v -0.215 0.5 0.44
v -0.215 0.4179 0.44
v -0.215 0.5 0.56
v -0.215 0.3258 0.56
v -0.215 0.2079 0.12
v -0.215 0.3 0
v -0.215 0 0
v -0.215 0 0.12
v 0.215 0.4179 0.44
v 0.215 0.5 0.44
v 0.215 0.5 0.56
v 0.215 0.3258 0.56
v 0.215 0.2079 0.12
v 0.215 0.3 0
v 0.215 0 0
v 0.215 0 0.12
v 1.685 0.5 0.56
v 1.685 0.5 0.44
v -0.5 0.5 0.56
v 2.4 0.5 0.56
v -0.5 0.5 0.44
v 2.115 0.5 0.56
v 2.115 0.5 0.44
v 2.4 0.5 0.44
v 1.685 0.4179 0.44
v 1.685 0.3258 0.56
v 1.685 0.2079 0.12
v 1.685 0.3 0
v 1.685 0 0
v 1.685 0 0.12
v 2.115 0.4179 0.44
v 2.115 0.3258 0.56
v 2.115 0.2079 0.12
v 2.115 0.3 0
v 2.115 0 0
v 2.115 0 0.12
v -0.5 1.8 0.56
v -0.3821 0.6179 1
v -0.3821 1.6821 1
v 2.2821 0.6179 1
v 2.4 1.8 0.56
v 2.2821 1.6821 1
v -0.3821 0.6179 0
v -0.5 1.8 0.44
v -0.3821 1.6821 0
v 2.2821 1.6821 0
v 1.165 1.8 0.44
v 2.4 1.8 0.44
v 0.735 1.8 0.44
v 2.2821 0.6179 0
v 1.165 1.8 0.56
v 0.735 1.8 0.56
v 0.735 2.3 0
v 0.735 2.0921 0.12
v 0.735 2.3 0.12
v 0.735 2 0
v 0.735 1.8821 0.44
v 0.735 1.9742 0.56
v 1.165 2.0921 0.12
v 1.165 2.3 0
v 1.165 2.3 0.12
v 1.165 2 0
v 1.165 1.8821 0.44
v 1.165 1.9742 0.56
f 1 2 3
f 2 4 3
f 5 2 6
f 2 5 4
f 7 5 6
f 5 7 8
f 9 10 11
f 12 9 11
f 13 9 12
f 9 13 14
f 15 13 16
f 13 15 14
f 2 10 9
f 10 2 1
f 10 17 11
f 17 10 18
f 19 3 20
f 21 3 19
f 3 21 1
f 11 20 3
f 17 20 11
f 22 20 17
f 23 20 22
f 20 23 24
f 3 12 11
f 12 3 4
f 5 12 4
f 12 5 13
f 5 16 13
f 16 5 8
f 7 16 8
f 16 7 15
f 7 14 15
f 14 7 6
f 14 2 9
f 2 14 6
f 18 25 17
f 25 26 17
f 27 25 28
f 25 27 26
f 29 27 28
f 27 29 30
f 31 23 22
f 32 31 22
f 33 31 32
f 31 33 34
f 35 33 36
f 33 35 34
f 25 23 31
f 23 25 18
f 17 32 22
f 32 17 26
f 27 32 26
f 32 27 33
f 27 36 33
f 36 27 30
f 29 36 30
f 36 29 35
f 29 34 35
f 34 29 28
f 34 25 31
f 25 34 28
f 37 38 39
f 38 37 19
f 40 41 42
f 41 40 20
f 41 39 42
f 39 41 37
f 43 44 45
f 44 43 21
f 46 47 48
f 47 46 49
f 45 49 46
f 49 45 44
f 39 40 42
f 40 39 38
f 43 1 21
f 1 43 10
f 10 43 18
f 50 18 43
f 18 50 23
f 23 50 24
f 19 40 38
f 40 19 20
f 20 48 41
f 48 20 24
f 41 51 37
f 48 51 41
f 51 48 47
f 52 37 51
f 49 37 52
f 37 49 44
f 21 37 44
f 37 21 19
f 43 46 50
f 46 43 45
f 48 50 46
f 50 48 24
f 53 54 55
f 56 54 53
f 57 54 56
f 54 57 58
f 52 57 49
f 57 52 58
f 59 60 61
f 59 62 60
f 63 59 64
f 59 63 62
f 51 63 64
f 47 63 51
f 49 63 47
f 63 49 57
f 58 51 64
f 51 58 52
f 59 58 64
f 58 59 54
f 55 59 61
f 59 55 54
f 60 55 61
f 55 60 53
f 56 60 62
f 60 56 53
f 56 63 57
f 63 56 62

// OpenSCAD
// file: pin.scad
// This module outputs bended pin
// _L - whole pin length
// _l - length of bottom part
// _H - whole pin height
// _th - pin thickness
// _a - bending angle
// _W - pin width
module pin(_L,_l,_H,_th,_a,_W)
{
	// Internal variables
    _d1 = _th*sin(_a) / (1-cos(_a));
    _d2 = (_th-_H)*cos(_a) / sin(_a);

	rotate([90,0,90])
    // Extrude the following polygon
	linear_extrude(height = _W, center = true, convexity = 10, twist = 0)
        polygon([[0,0],
                 [_l,0],
				 [_l+_d2,_H-_th],
				 [_L,_H-_th],
				 [_L,_H],
				 [_l+_d2-_d1,_H],
				 [_l-_d1,_th],
				 [0,_th]]);
}

// Example of usage
pin(2,1,1,0.2,115,0.5);
// file: case.scad
// This module draws case
// _L - case length
// _W - case width
// _H - case height
// _ph - top point (vertical) of pin connection area
// _pt - pin thickness
// _atl - case angle top left,
// _atr - case angle top right,
// _atu - case angle top up
// _atd - case angle top down
// _abl - case angle bottom left,
// _abr - case angle bottom right,
// _abu - case angle bottom up
// _abd - case angle bottom down
// _n_x - notch X position relative to case corner
// _n_y - notch Y position relative to case corner
// _n_d - notch diameter
// _n_z - notch_depth
module case(_L,_W,_H,_ph,_pt,_atl,_atr,_atu,_atd,_abl,_abr,_abu,_abd, _n_x, _n_y, _n_d, _n_z)
{
    _tth = _H - _ph;
    _bth = _ph - _pt;
    _dtl = _tth * cos(_atl) / sin(_atl);
    _dtr = _tth * cos(_atr) / sin(_atr);
    _dtu = _tth * cos(_atu) / sin(_atu);
    _dtd = _tth * cos(_atd) / sin(_atd);
    _dbl = _bth * cos(_abl) / sin(_abl);
    _dbr = _bth * cos(_abr) / sin(_abr);
    _dbu = _bth * cos(_abu) / sin(_abu);
    _dbd = _bth * cos(_abd) / sin(_abd);
	// Make case with notch - difference between case and small cylinder
    difference()
    {
        // This is our case
        polyhedron(
            points = [
                // top points
                [ 0 + _dtl, 0 + _dtd, _H],
                [_L - _dtr, 0 + _dtd, _H],
                [_L - _dtr,_W - _dtu, _H],
                [ 0 + _dtl,_W - _dtu, _H],
                // middle top points
                [ 0, 0,_ph],
                [_L, 0,_ph],
                [_L,_W,_ph],
                [ 0,_W,_ph],
                // middle bottom points
                [ 0, 0,_ph - _pt],
                [_L, 0,_ph - _pt],
                [_L,_W,_ph - _pt],
                [ 0,_W,_ph - _pt],
                // bottom points
                [ 0 + _dbl, 0 + _dbd, 0],
                [_L - _dbr, 0 + _dbd, 0],
                [_L - _dbr,_W - _dbu, 0],
                [ 0 + _dbl,_W - _dbu, 0]
            ],
            triangles = [
                // Top
                [ 0, 3, 2, 1],
                // Top sides
                [ 4, 0, 1, 5],
                [ 5, 1, 2, 6],
                [ 6, 2, 3, 7],
                [ 7, 3, 0, 4],
                // Middle sides
                [ 4, 5, 9, 8],
                [ 5, 6,10, 9],
                [ 6, 7,11,10],
                [ 7, 4, 8,11],
                // Bottom sides
                [12, 8, 9,13],
                [13, 9,10,14],
                [14,10,11,15],
                [15,11, 8,12],
                // Bottom
                [12,13,14,15]
            ]
        );
        // This is notch
        translate([_n_x,_n_y,_H])
            cylinder(r = _n_d/2, h = _n_z*2, center = true, $fn=10);
    }
}

// Example of usage
// case(10,5,1.5,0.7,0.3,80,80,80,80,45,45,45,45, 1,1,1);
// main file
use <case.scad>
use <pin.scad>

case_z = 1;
case_x = 2.9;
case_y = 1.3;
case_a = 75;

notch_d=0;
notch_depth=0.1;
notch_x=0.8;
notch_y=0.8;

side1_pins = 2;
side2_pins = 0;
side3_pins = 1;
side4_pins = 0;
pin_distance = 1.9;

pin_th = 0.12;
pin_W1 = 0.43;
pin_W2 = 0;
pin_W3 = 0.43;
pin_W4 = 0;
pin_L = 0.5;
pin_H = case_z/2+pin_th/2;
pin_l = 0.30;
pin_a = 105;

// Array of pins
// _cnt - number of pins
// _distance - distance between pin centres
module pins_array(_cnt, _distance, _pin_w)
{
	if (_cnt>0)
	{
		for (_i = [0:_cnt-1])
		{
			translate([_distance*_i,0,0])
				pin(pin_L,pin_l,pin_H,pin_th,pin_a,_pin_w);
		}
	}
}

// Complete model
union()
{
	// Top pins
	translate([(side1_pins-side3_pins)*pin_distance/2,case_y+pin_L*2,0])
		mirror([0,1,0])
			pins_array(side3_pins, pin_distance, pin_W3);

	// Bottom pins
	pins_array(side1_pins, pin_distance, pin_W1);

	// Left pins
	translate([-(case_x-(side1_pins-1)*pin_distance)/2 - pin_L,pin_L+case_y/2-(side4_pins-1)*pin_distance/2,0])
		mirror([1,0,0])
			rotate([0,0,90])
				pins_array(side4_pins, pin_distance);

	// Right pins
	translate([-(case_x-(side1_pins-1)*pin_distance)/2-pin_L+case_x+2*pin_L,pin_L+case_y/2-(side2_pins-1)*pin_distance/2,0])
		mirror([0,1,0])
			mirror([0,1,0])
				rotate([0,0,90])
					pins_array(side2_pins, pin_distance);

	// Case
	translate([-(case_x-(side1_pins-1)*pin_distance)/2,pin_L,0])
		case(case_x,case_y,case_z,pin_H,pin_th,case_a,case_a,case_a,case_a,case_a,case_a,case_a,case_a, notch_x,notch_y,notch_d,notch_depth);
}
